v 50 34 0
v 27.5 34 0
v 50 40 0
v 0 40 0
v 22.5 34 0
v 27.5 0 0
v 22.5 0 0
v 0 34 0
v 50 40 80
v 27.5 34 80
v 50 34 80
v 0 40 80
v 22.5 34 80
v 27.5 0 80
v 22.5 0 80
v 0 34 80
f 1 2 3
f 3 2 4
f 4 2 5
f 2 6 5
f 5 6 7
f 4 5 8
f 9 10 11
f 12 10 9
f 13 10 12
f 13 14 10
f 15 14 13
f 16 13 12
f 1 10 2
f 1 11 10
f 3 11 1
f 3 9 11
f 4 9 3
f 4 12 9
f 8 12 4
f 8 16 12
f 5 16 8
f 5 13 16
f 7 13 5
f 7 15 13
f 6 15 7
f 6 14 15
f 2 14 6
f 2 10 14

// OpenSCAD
$fn = 32;

// ----------------------------------------------------------------------
// Structural section: tee 50 x 40 mm
// ----------------------------------------------------------------------

// --- parameters (mm) ---
sec_w = 50;               // tee width, X
sec_h = 40;               // tee height, Y
flange_t = 6;             // top flange thickness
web_t = 5;                // web thickness
plate_t = 80;             // cut length, Z (extrusion height)

profile = [[22.5, 0], [27.5, 0], [27.5, 34], [50, 34], [50, 40], [0, 40], [0, 34], [22.5, 34]];  // primary outline, 8 points, counter clockwise

// --- the one profile operation ---
linear_extrude(height = plate_t) polygon(points = profile);
